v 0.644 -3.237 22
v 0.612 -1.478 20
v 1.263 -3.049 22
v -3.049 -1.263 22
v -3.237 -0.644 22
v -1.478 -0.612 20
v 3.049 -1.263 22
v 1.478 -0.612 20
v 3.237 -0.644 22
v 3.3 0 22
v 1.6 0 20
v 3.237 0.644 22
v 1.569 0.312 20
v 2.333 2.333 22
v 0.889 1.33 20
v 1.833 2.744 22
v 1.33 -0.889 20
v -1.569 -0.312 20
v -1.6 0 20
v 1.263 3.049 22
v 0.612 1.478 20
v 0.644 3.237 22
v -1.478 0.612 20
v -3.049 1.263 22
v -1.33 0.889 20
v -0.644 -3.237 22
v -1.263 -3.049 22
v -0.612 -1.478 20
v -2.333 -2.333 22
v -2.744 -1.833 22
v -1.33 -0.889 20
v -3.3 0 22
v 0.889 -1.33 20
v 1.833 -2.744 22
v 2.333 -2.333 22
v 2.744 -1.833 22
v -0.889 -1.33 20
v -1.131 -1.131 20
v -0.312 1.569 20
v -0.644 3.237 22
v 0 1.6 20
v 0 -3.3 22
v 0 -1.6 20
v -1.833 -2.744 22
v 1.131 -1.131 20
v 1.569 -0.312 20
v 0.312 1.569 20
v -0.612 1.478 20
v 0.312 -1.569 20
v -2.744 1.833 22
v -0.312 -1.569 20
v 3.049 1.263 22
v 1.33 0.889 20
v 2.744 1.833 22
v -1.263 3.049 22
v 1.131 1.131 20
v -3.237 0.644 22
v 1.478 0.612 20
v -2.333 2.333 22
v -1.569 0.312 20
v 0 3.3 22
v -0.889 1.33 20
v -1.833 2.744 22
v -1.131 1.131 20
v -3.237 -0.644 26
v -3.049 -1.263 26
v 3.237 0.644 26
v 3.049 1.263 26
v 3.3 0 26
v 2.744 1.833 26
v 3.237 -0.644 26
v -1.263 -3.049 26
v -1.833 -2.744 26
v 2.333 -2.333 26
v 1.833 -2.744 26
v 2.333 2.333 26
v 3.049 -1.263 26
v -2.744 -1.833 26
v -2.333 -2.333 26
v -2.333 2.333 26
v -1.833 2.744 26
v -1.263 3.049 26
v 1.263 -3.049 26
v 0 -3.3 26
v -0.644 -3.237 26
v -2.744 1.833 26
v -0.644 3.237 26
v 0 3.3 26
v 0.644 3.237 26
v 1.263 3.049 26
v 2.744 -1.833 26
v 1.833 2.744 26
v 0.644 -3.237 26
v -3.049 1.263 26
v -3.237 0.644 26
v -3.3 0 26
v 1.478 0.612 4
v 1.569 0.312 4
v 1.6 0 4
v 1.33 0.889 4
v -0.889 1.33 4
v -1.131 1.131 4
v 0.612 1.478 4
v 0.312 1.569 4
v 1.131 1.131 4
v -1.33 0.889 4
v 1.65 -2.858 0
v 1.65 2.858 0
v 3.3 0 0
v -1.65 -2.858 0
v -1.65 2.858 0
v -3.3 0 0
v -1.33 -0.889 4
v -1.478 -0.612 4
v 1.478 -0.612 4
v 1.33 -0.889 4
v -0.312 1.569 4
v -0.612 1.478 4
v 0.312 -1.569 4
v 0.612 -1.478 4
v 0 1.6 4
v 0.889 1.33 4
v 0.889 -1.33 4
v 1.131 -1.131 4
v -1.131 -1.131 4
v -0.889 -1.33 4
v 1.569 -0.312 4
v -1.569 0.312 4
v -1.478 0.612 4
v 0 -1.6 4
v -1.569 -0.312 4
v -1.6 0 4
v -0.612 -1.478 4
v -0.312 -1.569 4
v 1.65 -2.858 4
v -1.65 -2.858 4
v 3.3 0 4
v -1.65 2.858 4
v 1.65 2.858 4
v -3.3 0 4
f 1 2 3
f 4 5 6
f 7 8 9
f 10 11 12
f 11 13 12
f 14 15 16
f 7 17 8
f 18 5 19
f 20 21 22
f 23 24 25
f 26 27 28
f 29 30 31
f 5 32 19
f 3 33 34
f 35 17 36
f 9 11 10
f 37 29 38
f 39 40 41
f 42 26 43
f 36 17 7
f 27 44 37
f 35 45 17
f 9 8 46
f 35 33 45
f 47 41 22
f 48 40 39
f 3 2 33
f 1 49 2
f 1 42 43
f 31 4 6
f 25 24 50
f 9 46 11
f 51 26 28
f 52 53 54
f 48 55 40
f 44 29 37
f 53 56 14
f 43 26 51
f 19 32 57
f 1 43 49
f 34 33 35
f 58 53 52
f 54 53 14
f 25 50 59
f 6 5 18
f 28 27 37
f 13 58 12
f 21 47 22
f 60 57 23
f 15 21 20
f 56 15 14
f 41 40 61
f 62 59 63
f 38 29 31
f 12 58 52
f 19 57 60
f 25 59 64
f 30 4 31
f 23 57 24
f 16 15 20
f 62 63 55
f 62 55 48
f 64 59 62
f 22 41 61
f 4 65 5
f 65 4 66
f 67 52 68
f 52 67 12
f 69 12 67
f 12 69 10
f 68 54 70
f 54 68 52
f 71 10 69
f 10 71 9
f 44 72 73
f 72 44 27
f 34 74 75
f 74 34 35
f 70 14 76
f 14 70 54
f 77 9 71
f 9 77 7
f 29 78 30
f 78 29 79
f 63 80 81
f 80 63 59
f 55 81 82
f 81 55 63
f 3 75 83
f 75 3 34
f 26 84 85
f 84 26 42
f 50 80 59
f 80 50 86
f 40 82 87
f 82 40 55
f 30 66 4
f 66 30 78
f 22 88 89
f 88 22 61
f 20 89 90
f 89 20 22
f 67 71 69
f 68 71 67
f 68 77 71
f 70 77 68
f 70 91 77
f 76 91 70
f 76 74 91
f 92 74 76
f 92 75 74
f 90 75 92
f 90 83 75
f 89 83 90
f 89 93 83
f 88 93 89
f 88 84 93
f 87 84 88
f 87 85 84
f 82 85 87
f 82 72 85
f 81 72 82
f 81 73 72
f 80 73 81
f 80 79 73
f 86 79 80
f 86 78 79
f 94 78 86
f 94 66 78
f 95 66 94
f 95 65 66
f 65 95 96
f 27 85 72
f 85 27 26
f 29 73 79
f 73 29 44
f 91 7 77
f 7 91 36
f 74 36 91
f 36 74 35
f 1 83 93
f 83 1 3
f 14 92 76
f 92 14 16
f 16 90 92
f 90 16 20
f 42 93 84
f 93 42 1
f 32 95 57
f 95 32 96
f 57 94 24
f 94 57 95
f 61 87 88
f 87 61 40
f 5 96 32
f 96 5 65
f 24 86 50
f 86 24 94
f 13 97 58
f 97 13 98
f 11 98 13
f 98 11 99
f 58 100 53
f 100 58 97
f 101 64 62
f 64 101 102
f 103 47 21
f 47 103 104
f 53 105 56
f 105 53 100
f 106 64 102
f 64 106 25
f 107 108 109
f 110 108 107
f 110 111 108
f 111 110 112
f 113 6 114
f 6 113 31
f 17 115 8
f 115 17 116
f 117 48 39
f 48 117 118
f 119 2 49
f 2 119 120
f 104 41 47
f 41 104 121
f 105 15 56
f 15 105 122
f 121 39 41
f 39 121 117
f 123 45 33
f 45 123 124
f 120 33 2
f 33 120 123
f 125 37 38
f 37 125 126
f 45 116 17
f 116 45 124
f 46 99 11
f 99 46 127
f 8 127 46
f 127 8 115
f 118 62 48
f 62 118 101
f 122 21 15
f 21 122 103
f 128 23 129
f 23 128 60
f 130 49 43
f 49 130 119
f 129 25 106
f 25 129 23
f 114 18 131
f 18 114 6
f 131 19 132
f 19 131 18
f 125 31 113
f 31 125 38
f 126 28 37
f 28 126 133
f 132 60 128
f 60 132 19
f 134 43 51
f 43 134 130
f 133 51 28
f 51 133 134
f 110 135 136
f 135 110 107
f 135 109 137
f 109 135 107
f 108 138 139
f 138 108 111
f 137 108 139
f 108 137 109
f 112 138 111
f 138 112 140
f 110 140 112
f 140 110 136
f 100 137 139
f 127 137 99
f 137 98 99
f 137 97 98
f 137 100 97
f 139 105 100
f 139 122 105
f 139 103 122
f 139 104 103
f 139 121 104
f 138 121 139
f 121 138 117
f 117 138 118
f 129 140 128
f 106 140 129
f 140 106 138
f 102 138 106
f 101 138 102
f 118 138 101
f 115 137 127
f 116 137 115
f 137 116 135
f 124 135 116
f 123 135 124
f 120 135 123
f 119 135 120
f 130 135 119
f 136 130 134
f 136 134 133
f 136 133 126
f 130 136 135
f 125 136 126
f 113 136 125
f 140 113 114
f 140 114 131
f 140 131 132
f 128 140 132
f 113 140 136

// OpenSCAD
/**
 * Martin Egli
 * 2021-11-01
 * M3 screw cut outs
 */

module m3ScrewCut(len = 10, loc_res = 32) {
    translate([0, 0, 0])
    cylinder(d = 3.2, h = len, $fn = loc_res);
}

module m3SinkHeadCut(len = 4, loc_res = 32) {
    translate([0, 0, 0])
    cylinder(d1 = 3.2, d2 = 6.6, h = 2, $fn = loc_res);
    translate([0, 0, 2])
    cylinder(d = 6.6, h = len, $fn = loc_res);
}
module m3CylinderHeadCut(len = 4, loc_res = 32) {
    translate([0, 0, 0])
    cylinder(d = 6, h = len, $fn = loc_res);
}

module m3NutCut() {
    translate([0, 0, 0])
    cylinder(d = 6.6, h = 4, $fn = 6);
}

module m3SinkHeadScewNutCut(len = 10, loc_res = 32) {
    translate([0, 0, len])
    m3SinkHeadCut(4, loc_res);
    m3ScrewCut(len+1, loc_res);
    m3NutCut();
}

module m3CylinderHeadScewNutCut(len = 10, loc_res = 32) {
    translate([0, 0, len])
    m3CylinderHeadCut(4, loc_res);
    m3ScrewCut(len+1, loc_res);
    m3NutCut();
}

m3SinkHeadScewNutCut(20);
//m3CylinderHeadScewNutCut(15);
